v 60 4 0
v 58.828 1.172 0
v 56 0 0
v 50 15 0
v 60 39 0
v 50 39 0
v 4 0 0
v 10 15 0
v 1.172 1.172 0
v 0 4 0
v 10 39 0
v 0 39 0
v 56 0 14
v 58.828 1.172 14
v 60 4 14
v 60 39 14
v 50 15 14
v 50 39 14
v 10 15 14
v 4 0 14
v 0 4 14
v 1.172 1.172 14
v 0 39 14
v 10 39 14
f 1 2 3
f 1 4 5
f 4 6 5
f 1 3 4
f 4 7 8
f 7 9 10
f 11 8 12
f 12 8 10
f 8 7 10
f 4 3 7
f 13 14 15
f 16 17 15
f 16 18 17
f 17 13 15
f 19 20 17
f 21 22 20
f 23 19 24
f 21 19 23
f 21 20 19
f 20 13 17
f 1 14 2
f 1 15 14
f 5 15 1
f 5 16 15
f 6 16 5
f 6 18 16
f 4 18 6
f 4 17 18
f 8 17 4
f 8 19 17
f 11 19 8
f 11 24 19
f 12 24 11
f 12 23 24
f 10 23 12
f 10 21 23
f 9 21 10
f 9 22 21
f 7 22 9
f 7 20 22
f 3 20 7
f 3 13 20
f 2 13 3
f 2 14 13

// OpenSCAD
$fn = 32;

// ----------------------------------------------------------------------
// Heat sink frame: 60 x 39 mm frame, 10 mm walls
// ----------------------------------------------------------------------

// --- parameters (mm) ---
profile_height = 14;      // extrusion height
profile_points = 12;      // points of the closed outline

profile = [[0, 4], [1.172, 1.172], [4, 0], [56, 0], [58.828, 1.172], [60, 4], [60, 39], [50, 39], [50, 15], [10, 15], [10, 39], [0, 39]];  // single closed polygon, 12 points, counter clockwise

// --- the one profile operation ---
linear_extrude(height = profile_height) polygon(points = profile);
